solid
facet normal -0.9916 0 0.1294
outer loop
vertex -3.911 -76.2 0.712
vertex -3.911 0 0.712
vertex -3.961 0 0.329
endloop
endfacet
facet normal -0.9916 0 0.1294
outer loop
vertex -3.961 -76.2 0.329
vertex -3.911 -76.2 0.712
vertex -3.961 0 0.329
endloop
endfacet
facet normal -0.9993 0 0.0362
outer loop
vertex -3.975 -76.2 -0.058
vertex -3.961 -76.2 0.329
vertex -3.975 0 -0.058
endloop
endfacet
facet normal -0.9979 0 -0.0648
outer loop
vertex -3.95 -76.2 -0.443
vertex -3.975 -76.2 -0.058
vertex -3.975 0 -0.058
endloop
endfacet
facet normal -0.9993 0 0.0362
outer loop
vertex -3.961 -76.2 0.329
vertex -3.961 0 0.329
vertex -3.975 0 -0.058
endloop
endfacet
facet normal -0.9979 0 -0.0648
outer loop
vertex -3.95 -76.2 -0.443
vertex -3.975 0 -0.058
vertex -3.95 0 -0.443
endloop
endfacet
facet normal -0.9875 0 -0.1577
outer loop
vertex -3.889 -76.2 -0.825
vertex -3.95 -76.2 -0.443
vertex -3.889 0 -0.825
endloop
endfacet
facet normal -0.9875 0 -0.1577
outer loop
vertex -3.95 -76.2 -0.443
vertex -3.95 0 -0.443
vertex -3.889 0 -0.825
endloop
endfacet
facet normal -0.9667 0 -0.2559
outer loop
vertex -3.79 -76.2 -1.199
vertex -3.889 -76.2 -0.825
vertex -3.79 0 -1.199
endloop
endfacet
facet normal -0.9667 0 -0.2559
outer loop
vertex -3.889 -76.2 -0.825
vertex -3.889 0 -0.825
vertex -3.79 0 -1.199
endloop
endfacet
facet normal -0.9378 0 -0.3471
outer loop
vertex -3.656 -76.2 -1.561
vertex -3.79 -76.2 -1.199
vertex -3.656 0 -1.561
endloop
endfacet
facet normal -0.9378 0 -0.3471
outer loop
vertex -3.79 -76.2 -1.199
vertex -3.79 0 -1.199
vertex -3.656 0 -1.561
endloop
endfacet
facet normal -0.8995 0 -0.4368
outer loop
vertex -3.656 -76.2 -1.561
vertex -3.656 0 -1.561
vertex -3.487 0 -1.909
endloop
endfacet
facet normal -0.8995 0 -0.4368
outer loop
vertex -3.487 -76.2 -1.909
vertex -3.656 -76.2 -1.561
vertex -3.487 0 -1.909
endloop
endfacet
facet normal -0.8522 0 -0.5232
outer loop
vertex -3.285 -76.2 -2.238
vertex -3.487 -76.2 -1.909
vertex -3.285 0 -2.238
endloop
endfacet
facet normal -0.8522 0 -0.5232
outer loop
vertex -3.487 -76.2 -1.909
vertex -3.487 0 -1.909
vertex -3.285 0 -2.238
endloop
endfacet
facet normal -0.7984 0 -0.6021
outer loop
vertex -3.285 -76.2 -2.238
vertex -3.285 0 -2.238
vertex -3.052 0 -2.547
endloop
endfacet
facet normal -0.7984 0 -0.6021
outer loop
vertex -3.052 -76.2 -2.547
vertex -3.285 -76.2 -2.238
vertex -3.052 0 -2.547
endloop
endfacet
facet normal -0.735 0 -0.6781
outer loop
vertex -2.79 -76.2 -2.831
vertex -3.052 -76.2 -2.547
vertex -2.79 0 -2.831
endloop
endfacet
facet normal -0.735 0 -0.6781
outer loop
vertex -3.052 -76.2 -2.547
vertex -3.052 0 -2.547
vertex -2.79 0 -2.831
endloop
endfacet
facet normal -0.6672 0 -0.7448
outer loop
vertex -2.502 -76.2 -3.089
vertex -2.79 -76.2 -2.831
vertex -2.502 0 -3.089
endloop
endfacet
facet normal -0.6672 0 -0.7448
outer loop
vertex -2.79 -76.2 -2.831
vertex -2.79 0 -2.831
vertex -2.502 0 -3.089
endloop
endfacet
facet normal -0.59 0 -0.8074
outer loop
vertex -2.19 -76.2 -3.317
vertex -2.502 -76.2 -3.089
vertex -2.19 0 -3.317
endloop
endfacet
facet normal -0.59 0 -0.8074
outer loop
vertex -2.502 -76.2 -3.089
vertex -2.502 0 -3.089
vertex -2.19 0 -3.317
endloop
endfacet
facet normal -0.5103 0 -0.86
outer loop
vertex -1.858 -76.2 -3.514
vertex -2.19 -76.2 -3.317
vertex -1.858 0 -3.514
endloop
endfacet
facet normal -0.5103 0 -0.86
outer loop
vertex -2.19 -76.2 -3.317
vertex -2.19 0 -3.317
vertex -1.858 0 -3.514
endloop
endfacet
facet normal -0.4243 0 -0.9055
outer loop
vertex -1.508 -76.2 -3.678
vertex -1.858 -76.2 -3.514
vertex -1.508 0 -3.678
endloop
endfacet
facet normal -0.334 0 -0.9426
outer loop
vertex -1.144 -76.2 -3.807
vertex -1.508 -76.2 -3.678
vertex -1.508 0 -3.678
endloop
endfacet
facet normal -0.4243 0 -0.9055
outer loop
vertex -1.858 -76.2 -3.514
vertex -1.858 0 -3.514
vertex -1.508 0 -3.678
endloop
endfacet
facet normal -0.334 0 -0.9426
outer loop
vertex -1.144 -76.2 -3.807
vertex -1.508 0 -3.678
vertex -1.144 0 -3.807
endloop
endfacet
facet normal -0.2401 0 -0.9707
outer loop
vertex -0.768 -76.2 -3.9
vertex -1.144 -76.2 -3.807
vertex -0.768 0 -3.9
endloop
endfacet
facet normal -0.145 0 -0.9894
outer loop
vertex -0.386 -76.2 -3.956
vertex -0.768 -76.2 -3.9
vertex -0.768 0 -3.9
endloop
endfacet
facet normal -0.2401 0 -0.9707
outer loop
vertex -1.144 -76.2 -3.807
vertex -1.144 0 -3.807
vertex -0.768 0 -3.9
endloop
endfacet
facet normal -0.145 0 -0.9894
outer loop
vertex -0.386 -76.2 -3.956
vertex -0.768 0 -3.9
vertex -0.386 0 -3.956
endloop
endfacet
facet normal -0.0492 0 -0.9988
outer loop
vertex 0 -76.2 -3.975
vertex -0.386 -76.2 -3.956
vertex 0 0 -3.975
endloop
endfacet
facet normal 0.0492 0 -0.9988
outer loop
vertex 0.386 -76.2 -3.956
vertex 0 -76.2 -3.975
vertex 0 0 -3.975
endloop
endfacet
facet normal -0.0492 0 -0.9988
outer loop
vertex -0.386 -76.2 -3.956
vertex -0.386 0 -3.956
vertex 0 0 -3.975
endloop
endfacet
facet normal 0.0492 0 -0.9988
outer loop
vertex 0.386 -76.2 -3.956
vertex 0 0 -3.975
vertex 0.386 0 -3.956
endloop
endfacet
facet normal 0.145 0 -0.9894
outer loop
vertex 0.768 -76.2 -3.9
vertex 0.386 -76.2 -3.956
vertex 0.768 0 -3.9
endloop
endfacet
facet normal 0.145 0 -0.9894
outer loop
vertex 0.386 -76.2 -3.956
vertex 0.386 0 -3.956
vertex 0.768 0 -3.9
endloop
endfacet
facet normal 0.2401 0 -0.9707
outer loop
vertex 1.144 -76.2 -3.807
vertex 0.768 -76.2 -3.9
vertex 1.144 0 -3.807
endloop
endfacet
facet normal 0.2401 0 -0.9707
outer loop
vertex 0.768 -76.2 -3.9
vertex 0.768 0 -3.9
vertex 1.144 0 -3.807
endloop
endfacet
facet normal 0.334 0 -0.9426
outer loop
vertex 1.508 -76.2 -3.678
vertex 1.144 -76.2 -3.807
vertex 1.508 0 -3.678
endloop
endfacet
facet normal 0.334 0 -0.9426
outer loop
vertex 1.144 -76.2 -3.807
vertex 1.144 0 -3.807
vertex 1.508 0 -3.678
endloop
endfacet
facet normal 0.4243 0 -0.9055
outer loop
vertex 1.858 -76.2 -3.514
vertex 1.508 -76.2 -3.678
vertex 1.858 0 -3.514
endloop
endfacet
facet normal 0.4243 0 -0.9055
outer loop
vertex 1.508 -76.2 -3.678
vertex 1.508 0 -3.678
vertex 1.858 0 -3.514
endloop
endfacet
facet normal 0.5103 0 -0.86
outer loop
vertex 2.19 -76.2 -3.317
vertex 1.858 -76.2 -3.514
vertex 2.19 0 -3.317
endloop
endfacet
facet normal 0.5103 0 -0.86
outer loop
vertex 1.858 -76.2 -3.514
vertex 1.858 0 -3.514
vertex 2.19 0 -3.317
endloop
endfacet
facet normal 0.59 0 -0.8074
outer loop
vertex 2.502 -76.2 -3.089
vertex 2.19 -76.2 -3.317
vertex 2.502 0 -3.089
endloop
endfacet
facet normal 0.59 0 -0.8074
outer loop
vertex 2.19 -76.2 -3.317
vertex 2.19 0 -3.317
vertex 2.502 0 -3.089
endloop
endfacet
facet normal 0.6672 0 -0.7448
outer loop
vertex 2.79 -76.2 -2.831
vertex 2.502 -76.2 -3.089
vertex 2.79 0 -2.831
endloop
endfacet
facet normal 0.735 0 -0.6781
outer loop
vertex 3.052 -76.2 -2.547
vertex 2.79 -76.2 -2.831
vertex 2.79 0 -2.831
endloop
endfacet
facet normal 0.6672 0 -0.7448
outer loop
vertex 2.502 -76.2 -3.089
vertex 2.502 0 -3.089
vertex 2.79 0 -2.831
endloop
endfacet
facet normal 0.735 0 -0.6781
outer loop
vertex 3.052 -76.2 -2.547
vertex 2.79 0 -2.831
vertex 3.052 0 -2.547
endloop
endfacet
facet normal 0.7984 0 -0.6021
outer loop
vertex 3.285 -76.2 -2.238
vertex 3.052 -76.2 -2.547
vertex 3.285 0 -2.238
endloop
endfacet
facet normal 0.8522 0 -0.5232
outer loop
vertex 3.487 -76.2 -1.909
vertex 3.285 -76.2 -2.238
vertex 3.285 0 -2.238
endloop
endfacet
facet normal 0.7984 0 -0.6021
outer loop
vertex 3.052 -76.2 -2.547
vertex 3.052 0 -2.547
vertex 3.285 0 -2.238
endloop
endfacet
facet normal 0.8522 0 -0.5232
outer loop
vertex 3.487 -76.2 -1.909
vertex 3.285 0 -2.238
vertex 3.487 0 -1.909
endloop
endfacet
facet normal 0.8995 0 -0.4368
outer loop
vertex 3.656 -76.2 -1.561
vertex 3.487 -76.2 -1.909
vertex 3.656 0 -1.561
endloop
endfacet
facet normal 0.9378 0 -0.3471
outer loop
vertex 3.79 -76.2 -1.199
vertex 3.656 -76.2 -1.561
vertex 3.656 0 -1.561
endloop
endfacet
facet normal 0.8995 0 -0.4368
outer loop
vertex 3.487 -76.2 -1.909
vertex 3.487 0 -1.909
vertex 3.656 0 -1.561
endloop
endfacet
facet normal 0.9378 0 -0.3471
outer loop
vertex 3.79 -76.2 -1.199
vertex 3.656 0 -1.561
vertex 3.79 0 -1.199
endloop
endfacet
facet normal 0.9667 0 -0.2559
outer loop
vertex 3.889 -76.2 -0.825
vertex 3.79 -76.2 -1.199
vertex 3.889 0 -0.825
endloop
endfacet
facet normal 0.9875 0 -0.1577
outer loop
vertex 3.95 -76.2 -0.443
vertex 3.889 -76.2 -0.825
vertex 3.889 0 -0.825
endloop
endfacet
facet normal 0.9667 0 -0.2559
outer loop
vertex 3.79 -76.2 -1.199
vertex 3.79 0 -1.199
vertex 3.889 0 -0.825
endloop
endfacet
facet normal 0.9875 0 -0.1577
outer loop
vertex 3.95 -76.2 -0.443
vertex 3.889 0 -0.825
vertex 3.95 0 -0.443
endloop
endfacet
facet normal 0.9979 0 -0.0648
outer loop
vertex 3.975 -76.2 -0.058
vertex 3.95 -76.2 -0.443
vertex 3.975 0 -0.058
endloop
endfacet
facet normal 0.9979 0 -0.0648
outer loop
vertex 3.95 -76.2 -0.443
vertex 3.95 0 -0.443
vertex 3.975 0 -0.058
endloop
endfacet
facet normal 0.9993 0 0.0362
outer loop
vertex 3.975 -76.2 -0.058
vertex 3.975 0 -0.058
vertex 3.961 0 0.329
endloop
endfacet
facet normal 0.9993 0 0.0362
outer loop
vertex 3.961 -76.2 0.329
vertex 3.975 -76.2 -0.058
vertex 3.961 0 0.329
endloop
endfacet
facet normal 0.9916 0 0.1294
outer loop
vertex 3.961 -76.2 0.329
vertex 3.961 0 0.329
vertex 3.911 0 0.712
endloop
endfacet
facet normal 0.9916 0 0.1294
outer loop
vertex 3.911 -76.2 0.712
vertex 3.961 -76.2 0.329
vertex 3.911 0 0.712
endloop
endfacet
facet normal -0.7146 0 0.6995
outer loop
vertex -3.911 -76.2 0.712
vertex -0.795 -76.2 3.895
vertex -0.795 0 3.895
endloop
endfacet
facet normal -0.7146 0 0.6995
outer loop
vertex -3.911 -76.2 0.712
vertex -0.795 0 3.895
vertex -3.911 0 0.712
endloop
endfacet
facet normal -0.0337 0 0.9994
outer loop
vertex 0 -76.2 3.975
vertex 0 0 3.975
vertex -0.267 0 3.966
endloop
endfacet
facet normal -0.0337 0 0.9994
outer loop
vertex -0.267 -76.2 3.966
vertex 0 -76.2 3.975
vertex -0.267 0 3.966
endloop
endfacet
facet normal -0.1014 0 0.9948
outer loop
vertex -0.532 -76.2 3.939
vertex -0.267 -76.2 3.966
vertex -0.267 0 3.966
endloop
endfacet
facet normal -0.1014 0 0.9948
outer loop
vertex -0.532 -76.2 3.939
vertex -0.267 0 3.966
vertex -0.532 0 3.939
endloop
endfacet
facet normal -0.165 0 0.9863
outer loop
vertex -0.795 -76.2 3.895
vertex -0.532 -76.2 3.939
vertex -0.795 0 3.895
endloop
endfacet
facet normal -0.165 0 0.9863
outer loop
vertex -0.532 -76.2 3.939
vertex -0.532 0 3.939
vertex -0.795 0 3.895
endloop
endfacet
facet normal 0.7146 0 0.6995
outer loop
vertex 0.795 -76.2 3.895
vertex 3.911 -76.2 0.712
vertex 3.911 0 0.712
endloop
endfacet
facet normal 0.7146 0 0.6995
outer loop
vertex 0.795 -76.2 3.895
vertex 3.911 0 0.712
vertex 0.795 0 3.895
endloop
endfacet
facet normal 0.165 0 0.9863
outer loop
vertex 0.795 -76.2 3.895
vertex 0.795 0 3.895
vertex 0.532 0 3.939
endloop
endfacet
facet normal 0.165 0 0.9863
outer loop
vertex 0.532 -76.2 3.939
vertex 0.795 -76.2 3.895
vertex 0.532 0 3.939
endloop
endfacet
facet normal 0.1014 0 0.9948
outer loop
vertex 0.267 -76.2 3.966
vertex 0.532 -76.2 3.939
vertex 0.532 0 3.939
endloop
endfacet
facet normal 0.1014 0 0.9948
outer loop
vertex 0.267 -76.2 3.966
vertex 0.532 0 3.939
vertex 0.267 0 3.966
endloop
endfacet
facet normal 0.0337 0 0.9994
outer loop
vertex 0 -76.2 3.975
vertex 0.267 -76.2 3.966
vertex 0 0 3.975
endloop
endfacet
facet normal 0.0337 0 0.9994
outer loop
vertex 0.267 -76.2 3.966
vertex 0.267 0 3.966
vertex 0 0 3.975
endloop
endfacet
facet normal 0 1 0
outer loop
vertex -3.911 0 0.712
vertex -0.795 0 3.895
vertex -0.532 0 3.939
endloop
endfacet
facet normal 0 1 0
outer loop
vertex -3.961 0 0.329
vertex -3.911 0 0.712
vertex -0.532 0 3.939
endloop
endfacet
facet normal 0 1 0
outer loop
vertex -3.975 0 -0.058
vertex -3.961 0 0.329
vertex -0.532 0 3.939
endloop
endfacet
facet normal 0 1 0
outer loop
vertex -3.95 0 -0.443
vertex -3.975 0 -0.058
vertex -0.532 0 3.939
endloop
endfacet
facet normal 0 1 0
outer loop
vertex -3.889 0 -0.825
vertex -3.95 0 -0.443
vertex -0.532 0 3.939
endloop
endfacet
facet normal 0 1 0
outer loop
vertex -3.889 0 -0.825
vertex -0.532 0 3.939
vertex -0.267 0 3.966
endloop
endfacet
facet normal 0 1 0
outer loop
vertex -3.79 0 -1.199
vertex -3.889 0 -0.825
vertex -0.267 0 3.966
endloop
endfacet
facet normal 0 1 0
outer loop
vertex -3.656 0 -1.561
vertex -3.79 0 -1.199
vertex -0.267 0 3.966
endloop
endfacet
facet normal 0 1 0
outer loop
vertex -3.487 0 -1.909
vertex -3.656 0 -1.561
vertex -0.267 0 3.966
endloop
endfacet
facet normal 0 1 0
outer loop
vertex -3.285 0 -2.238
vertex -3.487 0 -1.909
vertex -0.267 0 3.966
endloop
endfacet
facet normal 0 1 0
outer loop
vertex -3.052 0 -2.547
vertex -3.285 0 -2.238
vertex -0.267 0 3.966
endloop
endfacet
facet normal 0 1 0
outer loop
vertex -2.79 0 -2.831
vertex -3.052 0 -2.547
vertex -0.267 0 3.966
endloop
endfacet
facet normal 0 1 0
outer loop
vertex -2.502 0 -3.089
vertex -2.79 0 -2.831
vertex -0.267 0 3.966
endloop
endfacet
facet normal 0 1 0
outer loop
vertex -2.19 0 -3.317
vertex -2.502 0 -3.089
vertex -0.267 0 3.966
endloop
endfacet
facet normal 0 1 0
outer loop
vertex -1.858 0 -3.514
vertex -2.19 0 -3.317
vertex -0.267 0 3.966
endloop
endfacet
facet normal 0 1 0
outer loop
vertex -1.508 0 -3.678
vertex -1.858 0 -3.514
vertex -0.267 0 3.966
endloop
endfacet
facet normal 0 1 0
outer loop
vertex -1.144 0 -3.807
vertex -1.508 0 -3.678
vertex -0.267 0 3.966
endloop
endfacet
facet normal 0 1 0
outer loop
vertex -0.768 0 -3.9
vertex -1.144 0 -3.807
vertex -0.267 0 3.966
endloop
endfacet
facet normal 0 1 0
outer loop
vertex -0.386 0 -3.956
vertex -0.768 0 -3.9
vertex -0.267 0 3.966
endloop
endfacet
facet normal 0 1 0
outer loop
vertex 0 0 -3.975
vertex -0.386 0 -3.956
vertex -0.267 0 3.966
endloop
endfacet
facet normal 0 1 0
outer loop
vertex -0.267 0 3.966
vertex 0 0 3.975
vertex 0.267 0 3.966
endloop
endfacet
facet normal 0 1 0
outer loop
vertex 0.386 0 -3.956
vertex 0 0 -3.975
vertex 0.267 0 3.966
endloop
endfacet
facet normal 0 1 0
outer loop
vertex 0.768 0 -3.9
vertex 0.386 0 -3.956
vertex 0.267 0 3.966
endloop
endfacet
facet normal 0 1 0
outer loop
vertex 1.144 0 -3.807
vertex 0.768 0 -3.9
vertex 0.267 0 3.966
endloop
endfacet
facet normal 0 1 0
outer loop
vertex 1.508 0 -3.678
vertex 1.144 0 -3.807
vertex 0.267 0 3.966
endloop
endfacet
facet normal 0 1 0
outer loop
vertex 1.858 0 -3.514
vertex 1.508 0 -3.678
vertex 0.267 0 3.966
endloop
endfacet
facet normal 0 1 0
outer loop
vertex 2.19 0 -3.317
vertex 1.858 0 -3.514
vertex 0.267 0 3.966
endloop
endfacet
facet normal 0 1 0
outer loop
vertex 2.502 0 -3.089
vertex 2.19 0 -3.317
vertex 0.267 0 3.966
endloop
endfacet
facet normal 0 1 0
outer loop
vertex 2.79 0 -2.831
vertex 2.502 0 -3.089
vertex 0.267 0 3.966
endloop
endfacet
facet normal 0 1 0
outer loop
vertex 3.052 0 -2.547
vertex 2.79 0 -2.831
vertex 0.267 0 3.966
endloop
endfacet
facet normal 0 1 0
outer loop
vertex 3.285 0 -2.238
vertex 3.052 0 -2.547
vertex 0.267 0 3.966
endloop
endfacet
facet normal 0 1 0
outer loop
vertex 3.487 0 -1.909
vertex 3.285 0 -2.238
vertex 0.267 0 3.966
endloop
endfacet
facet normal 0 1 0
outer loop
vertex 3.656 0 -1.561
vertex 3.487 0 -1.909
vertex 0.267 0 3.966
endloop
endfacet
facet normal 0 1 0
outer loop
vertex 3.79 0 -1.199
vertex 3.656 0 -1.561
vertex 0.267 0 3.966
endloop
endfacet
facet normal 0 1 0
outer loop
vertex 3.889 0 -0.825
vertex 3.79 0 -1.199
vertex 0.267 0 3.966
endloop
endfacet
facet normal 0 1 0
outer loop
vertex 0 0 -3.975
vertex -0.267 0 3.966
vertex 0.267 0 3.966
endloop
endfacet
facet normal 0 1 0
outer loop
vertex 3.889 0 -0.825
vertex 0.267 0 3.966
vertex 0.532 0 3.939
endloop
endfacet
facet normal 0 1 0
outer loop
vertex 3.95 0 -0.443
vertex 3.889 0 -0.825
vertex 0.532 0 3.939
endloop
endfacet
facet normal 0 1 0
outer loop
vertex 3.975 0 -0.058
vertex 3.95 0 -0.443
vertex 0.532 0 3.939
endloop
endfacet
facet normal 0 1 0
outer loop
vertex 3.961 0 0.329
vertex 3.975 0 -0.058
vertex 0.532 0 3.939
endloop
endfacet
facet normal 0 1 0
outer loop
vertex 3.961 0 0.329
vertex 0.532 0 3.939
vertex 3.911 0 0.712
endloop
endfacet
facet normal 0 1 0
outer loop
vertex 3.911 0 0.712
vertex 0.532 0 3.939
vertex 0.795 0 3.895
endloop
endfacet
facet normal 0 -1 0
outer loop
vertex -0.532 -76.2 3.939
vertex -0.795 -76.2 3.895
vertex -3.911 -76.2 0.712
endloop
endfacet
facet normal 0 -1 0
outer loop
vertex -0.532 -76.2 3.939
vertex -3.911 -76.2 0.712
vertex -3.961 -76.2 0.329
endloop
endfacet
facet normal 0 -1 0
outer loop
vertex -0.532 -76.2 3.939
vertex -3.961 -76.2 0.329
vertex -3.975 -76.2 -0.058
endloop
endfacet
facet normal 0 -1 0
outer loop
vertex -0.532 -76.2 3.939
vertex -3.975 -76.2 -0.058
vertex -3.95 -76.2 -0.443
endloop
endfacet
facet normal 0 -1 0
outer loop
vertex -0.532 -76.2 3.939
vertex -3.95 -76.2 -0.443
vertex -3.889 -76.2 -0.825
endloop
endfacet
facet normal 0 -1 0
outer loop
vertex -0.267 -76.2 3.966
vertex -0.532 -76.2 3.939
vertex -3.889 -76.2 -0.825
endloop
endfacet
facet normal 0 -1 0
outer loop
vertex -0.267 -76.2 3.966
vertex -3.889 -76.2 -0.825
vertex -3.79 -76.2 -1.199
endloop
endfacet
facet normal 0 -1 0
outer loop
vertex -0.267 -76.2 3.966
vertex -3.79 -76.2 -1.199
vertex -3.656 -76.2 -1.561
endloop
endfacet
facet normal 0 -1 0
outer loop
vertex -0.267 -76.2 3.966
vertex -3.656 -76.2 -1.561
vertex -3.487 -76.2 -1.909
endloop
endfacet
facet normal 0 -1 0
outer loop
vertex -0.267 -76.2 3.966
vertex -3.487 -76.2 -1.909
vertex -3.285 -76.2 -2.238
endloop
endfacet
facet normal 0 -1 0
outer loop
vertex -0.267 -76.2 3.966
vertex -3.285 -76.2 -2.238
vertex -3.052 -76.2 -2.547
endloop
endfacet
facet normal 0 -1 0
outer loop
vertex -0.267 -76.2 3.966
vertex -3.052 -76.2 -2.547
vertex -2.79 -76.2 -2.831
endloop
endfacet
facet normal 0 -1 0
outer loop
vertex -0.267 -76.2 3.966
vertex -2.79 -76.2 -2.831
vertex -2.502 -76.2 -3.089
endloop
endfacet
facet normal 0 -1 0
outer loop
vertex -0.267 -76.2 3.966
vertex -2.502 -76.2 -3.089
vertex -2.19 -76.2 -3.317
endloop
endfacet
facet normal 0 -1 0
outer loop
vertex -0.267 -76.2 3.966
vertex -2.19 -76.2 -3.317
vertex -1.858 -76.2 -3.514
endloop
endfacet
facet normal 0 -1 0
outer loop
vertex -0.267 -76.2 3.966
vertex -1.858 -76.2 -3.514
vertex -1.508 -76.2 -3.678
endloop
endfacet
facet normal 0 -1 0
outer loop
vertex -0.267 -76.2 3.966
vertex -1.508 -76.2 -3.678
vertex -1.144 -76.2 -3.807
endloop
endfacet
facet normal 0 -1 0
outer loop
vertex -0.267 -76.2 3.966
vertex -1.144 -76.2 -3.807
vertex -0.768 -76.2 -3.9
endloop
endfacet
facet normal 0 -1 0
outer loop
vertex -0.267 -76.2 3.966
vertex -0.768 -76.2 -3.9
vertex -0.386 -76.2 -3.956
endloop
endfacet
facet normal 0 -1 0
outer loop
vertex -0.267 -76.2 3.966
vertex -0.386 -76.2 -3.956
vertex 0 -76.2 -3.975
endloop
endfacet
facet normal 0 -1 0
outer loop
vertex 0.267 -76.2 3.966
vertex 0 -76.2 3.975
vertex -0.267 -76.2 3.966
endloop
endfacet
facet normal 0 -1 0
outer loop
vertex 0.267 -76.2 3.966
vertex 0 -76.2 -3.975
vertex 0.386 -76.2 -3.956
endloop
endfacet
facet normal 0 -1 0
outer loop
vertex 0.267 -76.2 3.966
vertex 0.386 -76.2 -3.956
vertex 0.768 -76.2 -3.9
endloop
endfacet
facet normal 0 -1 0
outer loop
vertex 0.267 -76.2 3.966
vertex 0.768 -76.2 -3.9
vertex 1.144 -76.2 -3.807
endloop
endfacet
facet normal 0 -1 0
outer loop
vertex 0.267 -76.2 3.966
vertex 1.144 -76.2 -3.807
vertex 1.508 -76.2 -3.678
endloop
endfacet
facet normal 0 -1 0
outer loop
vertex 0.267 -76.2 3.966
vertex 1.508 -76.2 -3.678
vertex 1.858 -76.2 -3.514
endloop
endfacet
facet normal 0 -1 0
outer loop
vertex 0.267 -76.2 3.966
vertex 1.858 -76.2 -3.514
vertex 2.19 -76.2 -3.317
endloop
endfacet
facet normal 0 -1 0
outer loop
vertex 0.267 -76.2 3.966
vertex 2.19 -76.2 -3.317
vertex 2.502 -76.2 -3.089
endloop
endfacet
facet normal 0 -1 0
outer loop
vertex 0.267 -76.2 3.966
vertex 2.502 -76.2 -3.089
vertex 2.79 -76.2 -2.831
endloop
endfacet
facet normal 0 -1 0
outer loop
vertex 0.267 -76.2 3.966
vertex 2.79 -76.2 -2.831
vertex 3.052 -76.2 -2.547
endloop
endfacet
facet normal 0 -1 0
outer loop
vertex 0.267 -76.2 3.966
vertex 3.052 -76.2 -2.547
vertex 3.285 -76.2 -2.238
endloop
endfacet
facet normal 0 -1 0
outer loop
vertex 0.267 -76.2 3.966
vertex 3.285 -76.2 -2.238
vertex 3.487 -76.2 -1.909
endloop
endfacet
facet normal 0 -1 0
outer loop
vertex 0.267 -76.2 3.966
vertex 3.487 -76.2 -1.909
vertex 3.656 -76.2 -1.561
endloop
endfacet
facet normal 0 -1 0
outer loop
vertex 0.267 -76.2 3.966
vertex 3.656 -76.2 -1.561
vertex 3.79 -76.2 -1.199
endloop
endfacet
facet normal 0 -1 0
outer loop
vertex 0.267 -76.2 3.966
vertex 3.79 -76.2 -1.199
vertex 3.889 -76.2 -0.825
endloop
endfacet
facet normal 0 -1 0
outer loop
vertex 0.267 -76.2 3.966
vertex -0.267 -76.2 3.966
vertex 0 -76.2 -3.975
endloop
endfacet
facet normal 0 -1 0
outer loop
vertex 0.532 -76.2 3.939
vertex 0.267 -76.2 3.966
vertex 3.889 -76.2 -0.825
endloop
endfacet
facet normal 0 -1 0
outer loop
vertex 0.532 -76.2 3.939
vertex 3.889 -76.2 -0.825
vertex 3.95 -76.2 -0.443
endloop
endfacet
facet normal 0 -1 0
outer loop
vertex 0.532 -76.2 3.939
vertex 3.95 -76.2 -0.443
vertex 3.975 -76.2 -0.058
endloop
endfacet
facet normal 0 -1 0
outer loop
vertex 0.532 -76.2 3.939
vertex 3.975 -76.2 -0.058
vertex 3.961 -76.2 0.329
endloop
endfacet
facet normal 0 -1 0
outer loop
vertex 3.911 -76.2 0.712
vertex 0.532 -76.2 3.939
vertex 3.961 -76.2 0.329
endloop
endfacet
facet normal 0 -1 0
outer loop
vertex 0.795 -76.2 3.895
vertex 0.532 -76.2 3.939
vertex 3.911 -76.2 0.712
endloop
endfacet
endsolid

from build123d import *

# Parameters (mm, degrees)
F1_DEPTH = 76.2


with BuildPart() as f1:
    # F0 (on Front) → F1 (new body)
    with BuildSketch(Plane.XZ):
        with BuildLine():
            Line((3.910824, 0.711952), (0.79495, 3.894801))
            ThreePointArc((0.79495, 3.894801), (0.399498, 3.954974), (0, 3.9751))
            ThreePointArc((0, 3.9751), (-0.399498, 3.954974), (-0.79495, 3.894801))
            Line((-0.79495, 3.894801), (-3.910824, 0.711952))
            ThreePointArc((-3.910824, 0.711952), (0, -3.9751), (3.910824, 0.711952))
        make_face()
    extrude(amount=F1_DEPTH)


solid = f1.part
